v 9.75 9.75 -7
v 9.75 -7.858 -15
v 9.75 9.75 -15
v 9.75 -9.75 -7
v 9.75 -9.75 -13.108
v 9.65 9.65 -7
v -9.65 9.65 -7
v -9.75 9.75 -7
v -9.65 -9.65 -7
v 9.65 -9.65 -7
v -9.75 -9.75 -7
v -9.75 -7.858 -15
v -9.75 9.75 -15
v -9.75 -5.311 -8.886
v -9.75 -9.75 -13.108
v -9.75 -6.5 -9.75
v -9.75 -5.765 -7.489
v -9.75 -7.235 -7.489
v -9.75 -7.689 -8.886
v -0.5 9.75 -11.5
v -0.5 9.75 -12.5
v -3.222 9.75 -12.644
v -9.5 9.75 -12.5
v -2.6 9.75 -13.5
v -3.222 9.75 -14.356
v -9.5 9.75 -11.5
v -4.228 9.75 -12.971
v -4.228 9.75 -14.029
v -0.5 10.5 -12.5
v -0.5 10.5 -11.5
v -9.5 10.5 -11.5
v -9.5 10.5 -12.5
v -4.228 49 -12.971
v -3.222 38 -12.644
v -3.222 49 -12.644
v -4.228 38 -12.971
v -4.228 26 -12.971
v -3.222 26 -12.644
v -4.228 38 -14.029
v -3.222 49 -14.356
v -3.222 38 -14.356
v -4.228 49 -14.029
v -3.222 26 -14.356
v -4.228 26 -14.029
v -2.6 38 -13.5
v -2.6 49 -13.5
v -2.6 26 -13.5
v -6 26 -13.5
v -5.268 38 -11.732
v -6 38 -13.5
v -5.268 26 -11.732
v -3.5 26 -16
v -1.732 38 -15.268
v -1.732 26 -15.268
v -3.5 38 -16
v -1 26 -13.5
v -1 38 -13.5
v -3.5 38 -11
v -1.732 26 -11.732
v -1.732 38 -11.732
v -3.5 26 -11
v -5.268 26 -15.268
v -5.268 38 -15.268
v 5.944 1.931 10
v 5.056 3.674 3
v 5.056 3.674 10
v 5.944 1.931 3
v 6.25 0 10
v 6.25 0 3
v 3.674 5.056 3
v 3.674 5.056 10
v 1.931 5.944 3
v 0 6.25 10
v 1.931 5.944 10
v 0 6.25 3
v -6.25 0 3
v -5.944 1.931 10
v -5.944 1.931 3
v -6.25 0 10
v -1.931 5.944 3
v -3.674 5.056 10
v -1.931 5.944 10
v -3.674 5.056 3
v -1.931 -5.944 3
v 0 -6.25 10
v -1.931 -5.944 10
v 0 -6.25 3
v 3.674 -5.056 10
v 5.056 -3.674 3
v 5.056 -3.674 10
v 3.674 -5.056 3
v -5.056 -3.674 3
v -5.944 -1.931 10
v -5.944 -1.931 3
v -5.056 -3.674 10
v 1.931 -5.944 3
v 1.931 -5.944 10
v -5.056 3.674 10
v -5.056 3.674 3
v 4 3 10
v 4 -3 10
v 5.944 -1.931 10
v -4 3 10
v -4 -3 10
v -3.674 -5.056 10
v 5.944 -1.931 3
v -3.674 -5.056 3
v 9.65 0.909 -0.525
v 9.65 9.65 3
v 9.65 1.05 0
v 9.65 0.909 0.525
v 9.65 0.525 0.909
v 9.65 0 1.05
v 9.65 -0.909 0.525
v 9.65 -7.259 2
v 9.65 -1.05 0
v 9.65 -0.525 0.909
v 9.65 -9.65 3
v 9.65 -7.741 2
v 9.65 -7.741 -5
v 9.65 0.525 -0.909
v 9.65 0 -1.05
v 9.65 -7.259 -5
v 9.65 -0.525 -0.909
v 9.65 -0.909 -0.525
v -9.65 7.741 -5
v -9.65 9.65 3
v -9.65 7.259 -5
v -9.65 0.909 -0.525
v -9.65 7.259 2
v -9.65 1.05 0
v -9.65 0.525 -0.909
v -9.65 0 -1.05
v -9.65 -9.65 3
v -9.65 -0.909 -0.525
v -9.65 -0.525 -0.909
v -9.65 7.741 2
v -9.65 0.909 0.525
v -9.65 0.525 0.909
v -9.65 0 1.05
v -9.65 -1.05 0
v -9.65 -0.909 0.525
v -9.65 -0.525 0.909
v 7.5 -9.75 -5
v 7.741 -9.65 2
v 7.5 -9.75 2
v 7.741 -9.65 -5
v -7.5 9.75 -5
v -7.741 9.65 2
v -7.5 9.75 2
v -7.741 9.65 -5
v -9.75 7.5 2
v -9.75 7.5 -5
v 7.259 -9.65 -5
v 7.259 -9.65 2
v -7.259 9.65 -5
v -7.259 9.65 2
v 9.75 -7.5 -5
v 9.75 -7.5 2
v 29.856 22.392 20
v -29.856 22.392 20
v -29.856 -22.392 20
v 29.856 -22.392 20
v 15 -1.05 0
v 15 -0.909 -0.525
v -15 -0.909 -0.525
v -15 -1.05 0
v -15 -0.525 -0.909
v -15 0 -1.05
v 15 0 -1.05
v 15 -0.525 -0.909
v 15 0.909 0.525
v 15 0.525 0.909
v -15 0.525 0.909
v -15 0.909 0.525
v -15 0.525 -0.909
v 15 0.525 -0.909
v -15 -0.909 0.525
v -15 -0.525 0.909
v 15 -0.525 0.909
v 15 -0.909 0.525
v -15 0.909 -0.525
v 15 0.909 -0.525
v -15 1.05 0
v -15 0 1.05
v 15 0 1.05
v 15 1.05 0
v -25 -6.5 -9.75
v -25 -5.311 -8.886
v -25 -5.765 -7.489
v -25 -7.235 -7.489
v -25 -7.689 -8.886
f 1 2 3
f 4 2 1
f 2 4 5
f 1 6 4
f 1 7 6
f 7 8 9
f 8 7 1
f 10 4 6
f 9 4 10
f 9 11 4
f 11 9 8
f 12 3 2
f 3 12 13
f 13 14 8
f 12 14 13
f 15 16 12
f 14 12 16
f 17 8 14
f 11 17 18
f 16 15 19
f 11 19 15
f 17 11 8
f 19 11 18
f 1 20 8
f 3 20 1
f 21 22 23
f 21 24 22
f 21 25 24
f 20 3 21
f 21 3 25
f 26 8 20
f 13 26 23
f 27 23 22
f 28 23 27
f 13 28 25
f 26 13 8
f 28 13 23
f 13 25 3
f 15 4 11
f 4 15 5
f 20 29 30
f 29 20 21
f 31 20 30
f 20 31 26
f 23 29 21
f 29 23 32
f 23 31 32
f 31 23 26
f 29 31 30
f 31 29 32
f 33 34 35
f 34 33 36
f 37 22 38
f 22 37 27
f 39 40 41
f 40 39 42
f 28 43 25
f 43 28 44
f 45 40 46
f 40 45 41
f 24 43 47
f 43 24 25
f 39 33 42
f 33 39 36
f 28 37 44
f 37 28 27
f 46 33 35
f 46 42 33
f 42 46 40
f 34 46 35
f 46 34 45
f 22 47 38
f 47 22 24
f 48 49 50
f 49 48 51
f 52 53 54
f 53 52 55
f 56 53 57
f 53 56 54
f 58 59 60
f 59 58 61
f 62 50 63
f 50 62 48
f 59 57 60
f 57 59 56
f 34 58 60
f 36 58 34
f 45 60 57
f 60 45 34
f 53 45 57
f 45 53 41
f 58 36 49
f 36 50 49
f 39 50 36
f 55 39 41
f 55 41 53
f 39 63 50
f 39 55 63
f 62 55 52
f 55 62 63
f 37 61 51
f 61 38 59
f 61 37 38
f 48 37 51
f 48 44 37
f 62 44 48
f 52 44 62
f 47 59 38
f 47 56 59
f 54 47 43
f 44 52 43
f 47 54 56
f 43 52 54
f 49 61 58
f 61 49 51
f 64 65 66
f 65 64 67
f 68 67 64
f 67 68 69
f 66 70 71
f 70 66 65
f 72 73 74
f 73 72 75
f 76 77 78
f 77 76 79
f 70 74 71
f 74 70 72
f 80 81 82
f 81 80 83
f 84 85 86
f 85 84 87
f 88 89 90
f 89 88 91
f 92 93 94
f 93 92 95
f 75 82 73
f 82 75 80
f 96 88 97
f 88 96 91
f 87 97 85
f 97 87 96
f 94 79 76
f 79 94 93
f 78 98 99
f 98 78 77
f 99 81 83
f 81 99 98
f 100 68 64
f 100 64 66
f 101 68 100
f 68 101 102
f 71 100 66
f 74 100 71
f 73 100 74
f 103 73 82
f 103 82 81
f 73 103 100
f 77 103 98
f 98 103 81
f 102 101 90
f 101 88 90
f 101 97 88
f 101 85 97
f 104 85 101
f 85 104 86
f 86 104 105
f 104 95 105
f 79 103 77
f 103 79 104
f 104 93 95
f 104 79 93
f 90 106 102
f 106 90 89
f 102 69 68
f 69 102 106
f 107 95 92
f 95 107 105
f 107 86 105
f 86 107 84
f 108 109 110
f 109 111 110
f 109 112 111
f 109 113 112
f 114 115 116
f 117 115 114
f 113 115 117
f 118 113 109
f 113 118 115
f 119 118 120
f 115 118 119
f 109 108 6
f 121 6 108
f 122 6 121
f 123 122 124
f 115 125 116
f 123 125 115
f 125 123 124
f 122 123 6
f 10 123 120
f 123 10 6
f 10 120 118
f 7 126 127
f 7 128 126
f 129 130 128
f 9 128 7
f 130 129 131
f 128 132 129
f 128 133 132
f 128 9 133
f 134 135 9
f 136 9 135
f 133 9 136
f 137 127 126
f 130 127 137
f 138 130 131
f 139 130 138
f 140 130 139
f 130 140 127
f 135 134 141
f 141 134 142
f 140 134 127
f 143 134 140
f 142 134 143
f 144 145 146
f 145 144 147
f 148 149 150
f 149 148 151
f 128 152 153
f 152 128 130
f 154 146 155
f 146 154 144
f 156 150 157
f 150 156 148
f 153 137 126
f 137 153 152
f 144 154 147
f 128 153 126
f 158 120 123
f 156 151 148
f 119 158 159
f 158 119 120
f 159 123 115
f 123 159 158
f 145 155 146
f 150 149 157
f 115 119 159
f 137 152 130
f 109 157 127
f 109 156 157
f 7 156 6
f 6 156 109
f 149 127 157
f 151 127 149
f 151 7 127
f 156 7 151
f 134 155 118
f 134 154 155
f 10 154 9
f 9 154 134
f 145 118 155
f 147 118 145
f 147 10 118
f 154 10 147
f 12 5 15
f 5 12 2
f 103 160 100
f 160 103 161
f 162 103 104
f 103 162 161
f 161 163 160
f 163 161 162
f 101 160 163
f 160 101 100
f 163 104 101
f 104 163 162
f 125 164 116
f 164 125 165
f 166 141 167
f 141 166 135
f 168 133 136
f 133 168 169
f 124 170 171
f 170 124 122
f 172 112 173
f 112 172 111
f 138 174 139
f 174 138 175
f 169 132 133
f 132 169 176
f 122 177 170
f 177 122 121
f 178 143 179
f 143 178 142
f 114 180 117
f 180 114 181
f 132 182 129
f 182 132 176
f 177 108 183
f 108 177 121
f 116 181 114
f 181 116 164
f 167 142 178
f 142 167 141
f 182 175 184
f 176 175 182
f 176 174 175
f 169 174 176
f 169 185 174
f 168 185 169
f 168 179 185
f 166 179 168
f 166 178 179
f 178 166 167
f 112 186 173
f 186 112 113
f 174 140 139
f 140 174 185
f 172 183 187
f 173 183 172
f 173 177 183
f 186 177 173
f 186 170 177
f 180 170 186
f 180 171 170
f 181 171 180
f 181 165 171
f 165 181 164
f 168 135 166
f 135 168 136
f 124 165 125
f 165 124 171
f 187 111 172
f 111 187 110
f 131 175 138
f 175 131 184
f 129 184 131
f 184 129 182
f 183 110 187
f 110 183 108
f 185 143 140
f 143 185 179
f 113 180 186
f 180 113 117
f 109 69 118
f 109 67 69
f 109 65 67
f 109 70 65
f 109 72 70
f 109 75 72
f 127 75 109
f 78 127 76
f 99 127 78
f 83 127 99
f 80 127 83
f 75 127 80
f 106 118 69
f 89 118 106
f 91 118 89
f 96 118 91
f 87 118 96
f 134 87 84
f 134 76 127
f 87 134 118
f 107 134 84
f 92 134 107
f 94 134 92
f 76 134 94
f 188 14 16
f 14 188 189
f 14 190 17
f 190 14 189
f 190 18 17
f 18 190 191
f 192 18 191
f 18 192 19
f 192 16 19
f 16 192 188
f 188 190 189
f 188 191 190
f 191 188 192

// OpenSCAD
/*
Copter parts library

(c) 2017 Fabian Huslik

https://github.com/fabianhu/
*/ 

translate([-110,0,0]) TX03();
translate([-80,0,0]) REVO16x16(); 
translate([-40,0,0]) ESC16x16();
translate([-5,0,0]) ESC20x20();
translate([30,0,0]) OMNIBUS20x20();
translate([65,0,0]) CAMERA();
translate([85,0,0]) RX_XM();
translate([100,0,0]) RX_XMPLUS();
translate([120,0,0]) TX_MM213TL();
translate([140,0,0]) BEEPER();
translate([160,0,0]) RUNCAM_SWIFT();

translate([200,0,0]) motor1103();
translate([260,0,0]) motor1807();
translate([300,0,0]) motor1105();

translate([-110,40,0]) TX03(true);
translate([-80,40,0]) REVO16x16(true); 
translate([-40,40,0]) ESC16x16(true);
translate([-5,40,0]) ESC20x20(true);
translate([30,40,0]) OMNIBUS20x20(true);
translate([65,40,0]) CAMERA(true);
translate([85,40,0]) RX_XM(true);
translate([100,40,0]) RX_XMPLUS(true);
translate([120,40,0]) TX_MM213TL(true);
translate([140,40,0]) BEEPER(true);
translate([160,40,0]) !RUNCAM_SWIFT(true);
translate([200,40,0]) motor1103(true);
translate([260,40,0]) motor1807(true);
translate([300,40,0]) motor1105(true);

// calculates the camera angle geometry for 4:3 format (diagonal angle)
module CAMANGLE(deg)
{
    dst=10;
    h0=6;
    w0=h0*4/3;//16/9;
    
    diag= (tan(deg/2)*dst)*2;
    w1=diag/5*4;
    
    scl= w1/w0;
    
    linear_extrude(height = dst, center = false, scale = scl) 
    {
        square([w0,h0],true);
    }
}


module TX03(clr=false)
{
  color("green") cube([19.6,17,4],center=true); // base PCA
  color("grey") translate([0,11.3,1]) cube([5.5,5.6,4],center=true);  // antenna PCA
  color("grey") translate([-6.3,4,2]) cube([7,9,3],center=true);  // LED
  color("grey") translate([-6.3,7,-1]) cube([5,4,2],center=true);  // SW
  color("grey") translate([0,14,2]) rotate([-90,0,0]) cylinder(d=3,h=54);
  color("grey") translate([0,14+30,2]) rotate([-90,0,0]) cylinder(d=5,h=10);
  color("grey") translate([6,-7,1.5]) cube([7,4,3],center=true);  // cabling
  if(clr)
  {
       color("red") translate([-6.5,9,-1]) rotate([-90,0,0]) cylinder(d=2.5,h=30); 
       color("red") translate([6,-7,1.5]) cube([7,4,10],center=true);  // cabling
       color("red") cube([19.6+1,17+1,4+1],center=true); // base PCA
  }
}

module ESC16x16(clr=false) 
{
    l = 15;
    PCB_x = 22.8;	
    PCB_y = 20.45;
    PCB_r = 3.5;
	hp=1.0; // PCB thickness
	
    difference()
    {
        
		color("green") hull()
        {
			for(i = [ 
			         [ (PCB_x-PCB_r)/2,   (PCB_y-PCB_r)/2,  0],
			         [ (PCB_x-PCB_r)/2, -(PCB_y-PCB_r)/2, 0],
			         [ -(PCB_x-PCB_r)/2,  (PCB_y-PCB_r)/2, 0],
			         [ -(PCB_x-PCB_r)/2,  -(PCB_y-PCB_r)/2, 0] ])
			{
				translate (i) cylinder(h=hp,r=PCB_r/2,$fn = 12);
			}
		}

		for(i = [ 
		         [  l/2,   l/2,  0],
		         [ l/2, -l/2, 0],
		         [-l/2,  l/2, 0],
		         [-l/2,  -l/2, 0] ])
		{   
			translate (i) cylinder(h=hp,d=2.15,$fn = 12);
		}
	}
	ttop=1.6;
	color("grey") translate([0,0,ttop/2+hp]) cube([19.8,10.7,ttop],true); // upper alongside block
	color("grey") translate([0,0,ttop/2+hp]) cube([6,17.8,ttop],true); // upper across block	
    tlow=0.6;
    color("grey") translate([0,0,-tlow/2]) cube([23,12,tlow],true); // lower alongside block
	color("grey") translate([0,0,-tlow/2]) cube([9.5,20,tlow],true); // lower across block


    if(clr)
    {
        color("red") translate([-11,0,-0.5]) cube([8,12,1],true); // upper connector space 
        color("red") translate([11,0,-0.5]) cube([8,12,1],true); // connector space
        for(i = [ [  l/2,   l/2,  0], [ l/2, -l/2, 0], [-l/2,  l/2, 0], [-l/2,  -l/2, 0] ])
        {   
			//color("red") translate (i) cylinder(h=1.6,d=4);
		} 
    }

}



module REVO16x16(clr=false) 
{
    l = 16;
	PCB_x = 20.3;
    PCB_y = 20.3;
    PCB_r = 3.5;
	h=1; // PCB thickness
	
    difference()
    {
        
		color("green") hull()
        {
			for(i = [ 
			         [ (PCB_x-PCB_r)/2,   (PCB_y-PCB_r)/2,  0],
			         [ (PCB_x-PCB_r)/2, -(PCB_y-PCB_r)/2, 0],
			         [ -(PCB_x-PCB_r)/2,  (PCB_y-PCB_r)/2, 0],
			         [ -(PCB_x-PCB_r)/2,  -(PCB_y-PCB_r)/2, 0] ])
			{
				translate (i) cylinder(h,r=PCB_r/2,$fn = 12);
			}
		}

		for(i = [ [  l/2,   l/2,  0], [ l/2, -l/2, 0], [-l/2,  l/2, 0], [-l/2,  -l/2, 0] ])
		{   
			translate (i) cylinder(h,d=2.2,$fn = 12);
		}
	}
	
	color("grey") translate([0,0,h/2]) cube([12.8,19,4.2],true); // inner block
	color("grey") translate([0,0,h/2]) cube([19,12.8,4.2],true); // inner block
	color("grey") translate([8.0,0,(2.7/2)+h]) cube([6,7.8,2.9],true); // USB
    //color("lightgrey") translate([0,8,(2.7/2)+h]) cube([8.5,6,4.0],true); // ESC conn
    
    if(clr)
    {
        color("red") translate([14.0,0,(2.7/2)+h]) cube([6,7.8,2.9],true); // USB connector
        color("red") translate([-9,0,0.75+h]) cube([3,13,2],true); // upper connector space 
        color("red") translate([0,-9,0.75+h]) cube([13,3,2],true); // connector space
       // color("red") translate([0,13,(2.7/2)+h]) cube([8.5,4,3.5],true); // ESC conn 
    
        for(i = [ [  l/2,   l/2,  0], [ l/2, -l/2, 0], [-l/2,  l/2, 0], [-l/2,  -l/2, 0] ])
        {   
			//color("red") translate (i) cylinder(h=1.6,d=4);
		}
    }
    
}


module copy_mirror(vec=[0,1,0])
{
    children();
    mirror(vec) children();
}


module ESC20x20(clr=false) 
{
	l = 20/2;
	lb= 31.0;
	wb= 27.5;
	h=1.0;
	r= 4;
	difference(){

		//PCB
        union()
        {
            color("green") hull()
            {
                w= (wb-r)/2;
                d = (wb-r)/2;
                for(i = [ 
                         [  w,   d,  0],
                         [ w, -d, 0],
                         [-w,  d, 0],
                         [-w,  -d, 0] ])
                {
                    translate (i) cylinder(h,d=r);
                }
            }
            
            color("green") translate([0,0,h/2]) cube([19.5,31,h],true);
        }
		
        for(i = [ 
		         [  l,   l,  -0.01],
		         [ l, -l, -0.01],
		         [-l,  l, -0.01],
		         [-l,  -l, -0.01] ])
		{   
			translate (i) cylinder(h+0.1,d=2.2,$fn=12);
		}
	}
	thick= clr?5:4.5;
    color("grey") translate([0,0,h/2]) cube([15,25.5,thick],true); // ok
	color("grey") translate([0,0,h/2]) cube([27,16.5,thick],true); // ok
    // color("white") translate([14,0,2.5]) cube([7,9,3],true); // connector removed
    
    // cables
    if(clr)
    {
    copy_mirror([0,1,0]) for(i = [-3.5*2.5:3.5:10] 
		        )
		{   
			color("red") translate ([ i, -10-3, +1.0+0.8]) rotate([90,0,0]) cylinder(h=10,d=2.5,$fn=12);
		}
        copy_mirror([0,1,0]) color("red") translate ([ 11, 2.5, -1.0-0.5]) rotate([90,0,90]) cylinder(h=15,d=3.5,$fn=12);

    }
    
}



module OMNIBUS20x20(clr=false) 
{


	l= 20/2;
	h=1.0; // PCB thickness
	difference()
    {

		color("green") hull()
        {
			for(i = [ 
			         [  l,   l,  0],
			         [ l, -l, 0],
			         [-l,  l, 0],
			         [-l,  -l, 0] ])
			{
				translate (i) cylinder(h,d=(27-20));
			}
		}

		for(i = [ 
		         [  l,   l,  0],
		         [ l, -l, 0],
		         [-l,  l, 0],
		         [-l,  -l, 0] ])
		{   
			translate (i) cylinder(h,d=2.2);
		}
	}
	thick= clr?5.6:1.8+h+1.8;
	color("grey") translate([0,0,h/2]) cube([16.5,27,thick],true); // inner block
	color("grey") translate([0,0,h/2]) cube([27,16.5,thick],true); // inner block
	color("grey") translate([11.5,0,(2.7/2)+h]) cube([6,7.8,2.8],true); // USB
    
    if(clr)
    {
        color("red") translate([11.5+5,0,(2.7/2)+h]) cube([6+5,7.8,2.8],true); // USB
    }
    
}

// micro camera
module CAMERA(clr=false) 
{
	h_lens=6.7;
	color("grey") cylinder(d=10+0.5,h=h_lens); // lens
	color("grey") translate([0,0,-3/2]) cube([12,12,3],true); // upper block

	color("grey") translate([0,0,-1.3/2-3]) cube([12.5,12.5,1.3],true); // PCB


	color("grey") hull()
    {
		translate([0,0,-4]) cube([12.5,12.5,3],true);
		translate([0,0,-4]) cube([8,8,7],true);
	}
	color("grey") translate([-4.5,2.0,-7.5])  rotate([-60,0,0]) cylinder(d=4,h=2.5); // mic

	color("red") if(clr)
    {
        translate([0,0,h_lens]) CAMANGLE(130); // view angle
        //hull() {
        color("grey") cylinder(d=11,h=h_lens); // lens
        //translate([0,-10,0]) color("grey") cylinder(d=10,h=h_lens); // lens ext}
		translate([0,0,-7]) cube([12.5,12.5,6],true); // conn block
		//translate([0,-10,-7]) cube([12.5,12.5,6],true); // conn block ext
        //translate([0,-10,-1.3/2-3]) cube([12.5,12.5,1.3],true); // PCB ext
        //translate([0,-10,-3/2]) cube([11.7,11.7,3],true); // upper block ext
        
	}

}

module RX_XMPLUS(clr=false)
{
	
    color("grey") cube([12,21.9,3.5],true);
	color("red") if(clr)
    {
		hull()
        {
			translate([1.5,-10,-1]) rotate([90,0,0]) cylinder(h=15,d=1.5);
			translate([5,-10,-1]) rotate([90,0,0]) cylinder(h=15,d=1.5);
		}
	}
}

module RX_XM(clr=false)
{
	
    color("grey") cube([10.3,16.9,3.5],true);
    color("grey") translate([0,-5,-1]) rotate([90,0,0]) cylinder(h=15,d=1.5);
	color("red") if(clr)
    {
			
	}
}

module TX_MM213TL(clr=false)
{
	color("grey") cube([19.5,22.5,3.5],true);

	color("grey") translate([5,-10.5,0]) rotate ([0,90,0])  cylinder(d=4,h=27);
	color("red") if(clr)
        {
		translate([0,10,0.5]) cube([13,4,4],true);
	}
}

module BEEPER(clr=false)
{
	color("grey") hull()
    {
        cylinder(d=9.2,h=6);
        translate([0,0,-1]) cylinder(d=6,h=1);
    }
	color("red") if(clr)
    {
        translate([0,0,-2]) cylinder(d=6,h=2);
        translate([0,0,6]) cylinder(d=9.5,h=2);
	}
	else
	{
		
	 
	}
}

module RUNCAM_SWIFT(ext=false) 
{
    FOV=150; // 2.1mm = 160° angle
    
    difference()
    {
        union()
        {
            color("grey") cylinder(d=12.5,h=10); // lens
            color("orange") rotate ([0,90,0]) cylinder(d=6,h=19.3,center=true); // fixing block
            color("orange") hull()
            {
                translate([7.5,-7.5,-5]) cylinder(d=4.5,h=7);
                translate([-7.5,7.5,-5]) cylinder(d=4.5,h=7);
            }
            //translate([0,0,-4.5-Conn_Len/2]) cube([19,19,9+Conn_Len],true);
            color("orange") translate([0,0,-1.5]) cube([14,13.3,7],true);
            color("darkgreen") translate([0,0,-1.9-5]) cube([19.3,19.3,3.8],true); // PCA
            color("lightgrey") translate([4.4,7.9,-2-5-3.5]) cube([10.2,3.2,3.5],true); // connector
            
            translate([0,0,-11]) 
            union()// TX
            {
                cube([19.5,19.5,8],true); 
                //translate([8,-8,-2]) cylinder(d=5.3,h=4,$fn=12);
                //translate([-8,8,-2]) cylinder(d=5.3,h=4,$fn=12);
                translate([-5,1,-1])cube([9,19,1],true); // upper PC extension
                
                color("lightgrey")translate([-3.5,6,-2.5]) rotate([-90,0,0]) cylinder(d=1.8,h=43); // antenna
                color("lightgrey")translate([-3.5,6,-2.5]) rotate([-90,0,0]) translate([0,0,20])cylinder(d=5,h=12); // antenna
            }
            
        }
        rotate ([0,90,0]) cylinder(d=2,h=20,center=true); // drill M2
        translate([0,-17,-20]) rotate([45,0,0]) cube([20,20,20],true); // connector
    }
    color("red")
    if(ext)
    {
        translate([0,0,10]) CAMANGLE(FOV); // view angle
        rotate ([0,90,0]) cylinder(d=2.1,h=30,center=true,$fn=12); // add M2+extension in case of substraction
        //translate([0,0,-1.5]) cube([16,16,9],true); // center block
        translate([0,0,-1.5]) cube([19.3,19.3,9],true); // center block
        
        translate([-10,-6.5,-8.5]) rotate ([0,90,0]) cylinder(d=2.5,h=30,center=true); // channel pushbutton
        //translate([0,0,-2-5-3.75]) cube([19,19,15],true); // TX extended for un/install
    }

}

module motor1103(ext=false)
{
     
    union(){
    color("grey",1.0) cylinder(d1=13,d2=14.4,h=1.5);
    color("grey",1.0) translate([0,0,1.5])cylinder(d=14.4,h=1);
    if(ext)
    {
        for(i=[0:90:360])
        {
            color("red") rotate([0,0,i-45]) translate([4.5,0,-10]) cylinder(d=2,h=10);
            color("red") rotate([0,0,i-45]) translate([4.5,0,-10]) cylinder(d=4,h=8);
        }
        color("red") translate([10,0,1]) cube([10,4.3,2],center=true); // cable
        color("blue") translate([9,0,4]) cube([5,4,5],center=true); // room for installation of cable
    }
    color("grey") translate([0,0,-1.5])cylinder(d=4,h=1.56); // free room for bearing 
  
    
    color("grey",1.0) translate([0,0,2.5]) cylinder(d=15.0,h=5); //bell
    }
    
    color("lime",1.0) translate([0,0,3+4.5]) cylinder(d=2.0*25.4+0.25,h=4.5); //prop
}

module motor1105(ext=false)
{
    //cylinder(d=14.5,h=12.5); 
    union(){
    color("grey",1.0) cylinder(d1=13,d2=14.4,h=1.5);
    color("grey",1.0) translate([0,0,1.5])cylinder(d=14.4,h=1);
    if(ext)
    {
        for(i=[0:90:360])
        {
            color("red") rotate([0,0,i-45]) translate([4.5,0,-10]) cylinder(d=2,h=10);
            color("red") rotate([0,0,i-45]) translate([4.5,0,-10]) cylinder(d=4,h=8);
        }
        color("red") translate([10,0,1]) cube([10,4.3,2],center=true); // cable
        color("blue") translate([9,0,4]) cube([5,4,5],center=true); // room for installation of cable
    }
    color("grey") translate([0,0,-1.5])cylinder(d=4,h=1.56); // free room for bearing 
  
    
    color("grey",1.0) translate([0,0,2.5]) cylinder(d=15.0,h=5+5); //bell
    }
    if(ext)
    color("red",1.0) translate([0,0,11.5]) cylinder(d=2.0*25.4+0.75,h=6.5,$fn=60); //prop
    else
    color("lime",1.0) translate([0,0,12.5]) cylinder(d=2.0*25.4+0.25,h=4.5); //prop    
}

module motor1807(ext=false)
{
     
    union(){
    color("grey",1.0) cylinder(d1=16,d2=18.65,h=5);
    color("grey",1.0) translate([0,0,5])cylinder(d=18.65,h=18-5); // upper motor
    if(ext)
    {
        for(i=[0:90:360])
        {
            color("red") rotate([0,0,i-45]) translate([6,0,-10]) cylinder(d=2,h=10);
            color("red") rotate([0,0,i-45]) translate([6,0,-10]) cylinder(d=4,h=8);
        }
        color("red") translate([10,0,1.5]) cube([10,7,3],center=true); // cable
        color("blue") translate([9,0,4]) cube([5,5,5],center=true); // room for installation of cable
    }
    color("grey") translate([0,0,-1.5])cylinder(d=4,h=1.56); // free room for bearing 
  
    
    color("grey",1.0) translate([0,0,2.5]) cylinder(d=15.0,h=5); //bell
    }
    
    color("lime",1.0) translate([0,0,18]) cylinder(d=102,h=6.2); //prop
    color("black",1.0) translate([0,0,0]) cylinder(d=9,h=31,$fn=6); //prop
   
}
